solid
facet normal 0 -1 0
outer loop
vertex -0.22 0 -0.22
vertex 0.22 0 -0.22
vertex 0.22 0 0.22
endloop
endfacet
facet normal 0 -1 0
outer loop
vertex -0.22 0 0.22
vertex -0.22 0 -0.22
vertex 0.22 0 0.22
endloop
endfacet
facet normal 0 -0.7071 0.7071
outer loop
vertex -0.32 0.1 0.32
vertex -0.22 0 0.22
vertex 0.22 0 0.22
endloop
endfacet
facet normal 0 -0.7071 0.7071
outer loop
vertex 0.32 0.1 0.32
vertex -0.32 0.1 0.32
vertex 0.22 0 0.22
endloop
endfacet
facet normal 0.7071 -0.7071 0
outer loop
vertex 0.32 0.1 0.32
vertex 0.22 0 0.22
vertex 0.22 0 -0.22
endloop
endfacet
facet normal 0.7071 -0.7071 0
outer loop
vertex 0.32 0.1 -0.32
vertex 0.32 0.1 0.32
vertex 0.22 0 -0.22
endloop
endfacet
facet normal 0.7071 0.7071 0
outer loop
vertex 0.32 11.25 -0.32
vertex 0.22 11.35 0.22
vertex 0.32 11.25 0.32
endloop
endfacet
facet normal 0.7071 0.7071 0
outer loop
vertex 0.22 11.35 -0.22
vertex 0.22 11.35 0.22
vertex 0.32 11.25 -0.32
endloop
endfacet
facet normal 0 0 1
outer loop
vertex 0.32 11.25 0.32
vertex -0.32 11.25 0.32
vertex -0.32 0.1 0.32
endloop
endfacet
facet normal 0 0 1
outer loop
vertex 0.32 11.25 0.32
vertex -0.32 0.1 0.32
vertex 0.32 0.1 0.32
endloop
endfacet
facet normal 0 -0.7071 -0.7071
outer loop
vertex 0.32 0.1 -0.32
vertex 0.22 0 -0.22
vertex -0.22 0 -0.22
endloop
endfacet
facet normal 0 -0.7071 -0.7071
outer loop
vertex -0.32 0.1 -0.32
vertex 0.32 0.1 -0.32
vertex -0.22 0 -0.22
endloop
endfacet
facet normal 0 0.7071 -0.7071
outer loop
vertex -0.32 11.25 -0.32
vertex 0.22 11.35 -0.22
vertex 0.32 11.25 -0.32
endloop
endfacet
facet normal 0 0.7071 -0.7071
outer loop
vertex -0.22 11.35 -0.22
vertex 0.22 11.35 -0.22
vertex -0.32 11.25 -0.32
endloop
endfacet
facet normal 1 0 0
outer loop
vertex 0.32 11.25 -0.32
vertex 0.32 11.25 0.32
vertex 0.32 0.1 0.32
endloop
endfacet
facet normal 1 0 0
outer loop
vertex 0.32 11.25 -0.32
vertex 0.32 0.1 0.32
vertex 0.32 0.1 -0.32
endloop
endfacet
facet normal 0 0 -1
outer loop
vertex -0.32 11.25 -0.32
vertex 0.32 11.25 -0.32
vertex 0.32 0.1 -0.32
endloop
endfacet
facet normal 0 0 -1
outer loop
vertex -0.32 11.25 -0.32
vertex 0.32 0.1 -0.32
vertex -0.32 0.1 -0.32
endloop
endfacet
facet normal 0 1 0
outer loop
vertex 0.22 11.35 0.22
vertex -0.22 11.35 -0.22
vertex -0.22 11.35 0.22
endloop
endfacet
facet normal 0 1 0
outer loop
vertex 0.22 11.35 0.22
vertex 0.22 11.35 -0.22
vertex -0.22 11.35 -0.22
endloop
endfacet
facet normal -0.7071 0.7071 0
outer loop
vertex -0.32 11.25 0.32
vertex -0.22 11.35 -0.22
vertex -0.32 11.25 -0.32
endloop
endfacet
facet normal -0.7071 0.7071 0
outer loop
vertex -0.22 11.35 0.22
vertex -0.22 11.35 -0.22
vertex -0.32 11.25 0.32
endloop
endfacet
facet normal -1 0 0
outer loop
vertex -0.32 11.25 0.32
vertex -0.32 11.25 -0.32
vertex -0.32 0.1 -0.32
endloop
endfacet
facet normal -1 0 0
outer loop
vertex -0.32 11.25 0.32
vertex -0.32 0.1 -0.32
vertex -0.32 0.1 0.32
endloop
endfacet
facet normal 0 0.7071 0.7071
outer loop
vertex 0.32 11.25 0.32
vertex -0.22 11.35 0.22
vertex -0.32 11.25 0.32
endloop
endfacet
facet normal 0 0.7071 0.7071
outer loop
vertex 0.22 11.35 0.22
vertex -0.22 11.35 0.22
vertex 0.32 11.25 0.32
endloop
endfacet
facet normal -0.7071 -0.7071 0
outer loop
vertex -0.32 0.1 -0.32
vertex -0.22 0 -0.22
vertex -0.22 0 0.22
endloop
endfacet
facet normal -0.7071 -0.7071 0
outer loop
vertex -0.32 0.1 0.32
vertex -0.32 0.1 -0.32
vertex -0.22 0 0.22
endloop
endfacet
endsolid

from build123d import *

# Parameters (mm, degrees)
SKETCH_1_W     = 0.64
SKETCH_1_H     = 0.64
CHAMFER_1_SIZE = 0.1


with BuildPart() as part:
    # По траектории1: sweep along a path in Эскиз2
    with BuildLine(Plane.XY) as sweep_1_path:
        Line((0, 0), (0, 11.35))
    # Эскиз1 → По траектории1 (sweep)
    with BuildSketch(Plane(origin=(0, 0, 0), x_dir=(1, 0, 0), z_dir=(0, 1, 0))):
        Rectangle(SKETCH_1_W, SKETCH_1_H)
    sweep(path=sweep_1_path.line)

    # Фаска1
    chamfer_1_edges = [part.edges().sort_by_distance(p)[0] for p in [
        (-0.32, 11.35, 0),
        (0, 11.35, 0.32),
        (0.32, 11.35, 0),
        (0, 0, 0.32),
        (-0.32, 0, 0),
        (0, 0, -0.32),
        (0.32, 0, 0),
        (0, 11.35, -0.32),
    ]]
    chamfer(chamfer_1_edges, length=CHAMFER_1_SIZE)


solid = part.part
